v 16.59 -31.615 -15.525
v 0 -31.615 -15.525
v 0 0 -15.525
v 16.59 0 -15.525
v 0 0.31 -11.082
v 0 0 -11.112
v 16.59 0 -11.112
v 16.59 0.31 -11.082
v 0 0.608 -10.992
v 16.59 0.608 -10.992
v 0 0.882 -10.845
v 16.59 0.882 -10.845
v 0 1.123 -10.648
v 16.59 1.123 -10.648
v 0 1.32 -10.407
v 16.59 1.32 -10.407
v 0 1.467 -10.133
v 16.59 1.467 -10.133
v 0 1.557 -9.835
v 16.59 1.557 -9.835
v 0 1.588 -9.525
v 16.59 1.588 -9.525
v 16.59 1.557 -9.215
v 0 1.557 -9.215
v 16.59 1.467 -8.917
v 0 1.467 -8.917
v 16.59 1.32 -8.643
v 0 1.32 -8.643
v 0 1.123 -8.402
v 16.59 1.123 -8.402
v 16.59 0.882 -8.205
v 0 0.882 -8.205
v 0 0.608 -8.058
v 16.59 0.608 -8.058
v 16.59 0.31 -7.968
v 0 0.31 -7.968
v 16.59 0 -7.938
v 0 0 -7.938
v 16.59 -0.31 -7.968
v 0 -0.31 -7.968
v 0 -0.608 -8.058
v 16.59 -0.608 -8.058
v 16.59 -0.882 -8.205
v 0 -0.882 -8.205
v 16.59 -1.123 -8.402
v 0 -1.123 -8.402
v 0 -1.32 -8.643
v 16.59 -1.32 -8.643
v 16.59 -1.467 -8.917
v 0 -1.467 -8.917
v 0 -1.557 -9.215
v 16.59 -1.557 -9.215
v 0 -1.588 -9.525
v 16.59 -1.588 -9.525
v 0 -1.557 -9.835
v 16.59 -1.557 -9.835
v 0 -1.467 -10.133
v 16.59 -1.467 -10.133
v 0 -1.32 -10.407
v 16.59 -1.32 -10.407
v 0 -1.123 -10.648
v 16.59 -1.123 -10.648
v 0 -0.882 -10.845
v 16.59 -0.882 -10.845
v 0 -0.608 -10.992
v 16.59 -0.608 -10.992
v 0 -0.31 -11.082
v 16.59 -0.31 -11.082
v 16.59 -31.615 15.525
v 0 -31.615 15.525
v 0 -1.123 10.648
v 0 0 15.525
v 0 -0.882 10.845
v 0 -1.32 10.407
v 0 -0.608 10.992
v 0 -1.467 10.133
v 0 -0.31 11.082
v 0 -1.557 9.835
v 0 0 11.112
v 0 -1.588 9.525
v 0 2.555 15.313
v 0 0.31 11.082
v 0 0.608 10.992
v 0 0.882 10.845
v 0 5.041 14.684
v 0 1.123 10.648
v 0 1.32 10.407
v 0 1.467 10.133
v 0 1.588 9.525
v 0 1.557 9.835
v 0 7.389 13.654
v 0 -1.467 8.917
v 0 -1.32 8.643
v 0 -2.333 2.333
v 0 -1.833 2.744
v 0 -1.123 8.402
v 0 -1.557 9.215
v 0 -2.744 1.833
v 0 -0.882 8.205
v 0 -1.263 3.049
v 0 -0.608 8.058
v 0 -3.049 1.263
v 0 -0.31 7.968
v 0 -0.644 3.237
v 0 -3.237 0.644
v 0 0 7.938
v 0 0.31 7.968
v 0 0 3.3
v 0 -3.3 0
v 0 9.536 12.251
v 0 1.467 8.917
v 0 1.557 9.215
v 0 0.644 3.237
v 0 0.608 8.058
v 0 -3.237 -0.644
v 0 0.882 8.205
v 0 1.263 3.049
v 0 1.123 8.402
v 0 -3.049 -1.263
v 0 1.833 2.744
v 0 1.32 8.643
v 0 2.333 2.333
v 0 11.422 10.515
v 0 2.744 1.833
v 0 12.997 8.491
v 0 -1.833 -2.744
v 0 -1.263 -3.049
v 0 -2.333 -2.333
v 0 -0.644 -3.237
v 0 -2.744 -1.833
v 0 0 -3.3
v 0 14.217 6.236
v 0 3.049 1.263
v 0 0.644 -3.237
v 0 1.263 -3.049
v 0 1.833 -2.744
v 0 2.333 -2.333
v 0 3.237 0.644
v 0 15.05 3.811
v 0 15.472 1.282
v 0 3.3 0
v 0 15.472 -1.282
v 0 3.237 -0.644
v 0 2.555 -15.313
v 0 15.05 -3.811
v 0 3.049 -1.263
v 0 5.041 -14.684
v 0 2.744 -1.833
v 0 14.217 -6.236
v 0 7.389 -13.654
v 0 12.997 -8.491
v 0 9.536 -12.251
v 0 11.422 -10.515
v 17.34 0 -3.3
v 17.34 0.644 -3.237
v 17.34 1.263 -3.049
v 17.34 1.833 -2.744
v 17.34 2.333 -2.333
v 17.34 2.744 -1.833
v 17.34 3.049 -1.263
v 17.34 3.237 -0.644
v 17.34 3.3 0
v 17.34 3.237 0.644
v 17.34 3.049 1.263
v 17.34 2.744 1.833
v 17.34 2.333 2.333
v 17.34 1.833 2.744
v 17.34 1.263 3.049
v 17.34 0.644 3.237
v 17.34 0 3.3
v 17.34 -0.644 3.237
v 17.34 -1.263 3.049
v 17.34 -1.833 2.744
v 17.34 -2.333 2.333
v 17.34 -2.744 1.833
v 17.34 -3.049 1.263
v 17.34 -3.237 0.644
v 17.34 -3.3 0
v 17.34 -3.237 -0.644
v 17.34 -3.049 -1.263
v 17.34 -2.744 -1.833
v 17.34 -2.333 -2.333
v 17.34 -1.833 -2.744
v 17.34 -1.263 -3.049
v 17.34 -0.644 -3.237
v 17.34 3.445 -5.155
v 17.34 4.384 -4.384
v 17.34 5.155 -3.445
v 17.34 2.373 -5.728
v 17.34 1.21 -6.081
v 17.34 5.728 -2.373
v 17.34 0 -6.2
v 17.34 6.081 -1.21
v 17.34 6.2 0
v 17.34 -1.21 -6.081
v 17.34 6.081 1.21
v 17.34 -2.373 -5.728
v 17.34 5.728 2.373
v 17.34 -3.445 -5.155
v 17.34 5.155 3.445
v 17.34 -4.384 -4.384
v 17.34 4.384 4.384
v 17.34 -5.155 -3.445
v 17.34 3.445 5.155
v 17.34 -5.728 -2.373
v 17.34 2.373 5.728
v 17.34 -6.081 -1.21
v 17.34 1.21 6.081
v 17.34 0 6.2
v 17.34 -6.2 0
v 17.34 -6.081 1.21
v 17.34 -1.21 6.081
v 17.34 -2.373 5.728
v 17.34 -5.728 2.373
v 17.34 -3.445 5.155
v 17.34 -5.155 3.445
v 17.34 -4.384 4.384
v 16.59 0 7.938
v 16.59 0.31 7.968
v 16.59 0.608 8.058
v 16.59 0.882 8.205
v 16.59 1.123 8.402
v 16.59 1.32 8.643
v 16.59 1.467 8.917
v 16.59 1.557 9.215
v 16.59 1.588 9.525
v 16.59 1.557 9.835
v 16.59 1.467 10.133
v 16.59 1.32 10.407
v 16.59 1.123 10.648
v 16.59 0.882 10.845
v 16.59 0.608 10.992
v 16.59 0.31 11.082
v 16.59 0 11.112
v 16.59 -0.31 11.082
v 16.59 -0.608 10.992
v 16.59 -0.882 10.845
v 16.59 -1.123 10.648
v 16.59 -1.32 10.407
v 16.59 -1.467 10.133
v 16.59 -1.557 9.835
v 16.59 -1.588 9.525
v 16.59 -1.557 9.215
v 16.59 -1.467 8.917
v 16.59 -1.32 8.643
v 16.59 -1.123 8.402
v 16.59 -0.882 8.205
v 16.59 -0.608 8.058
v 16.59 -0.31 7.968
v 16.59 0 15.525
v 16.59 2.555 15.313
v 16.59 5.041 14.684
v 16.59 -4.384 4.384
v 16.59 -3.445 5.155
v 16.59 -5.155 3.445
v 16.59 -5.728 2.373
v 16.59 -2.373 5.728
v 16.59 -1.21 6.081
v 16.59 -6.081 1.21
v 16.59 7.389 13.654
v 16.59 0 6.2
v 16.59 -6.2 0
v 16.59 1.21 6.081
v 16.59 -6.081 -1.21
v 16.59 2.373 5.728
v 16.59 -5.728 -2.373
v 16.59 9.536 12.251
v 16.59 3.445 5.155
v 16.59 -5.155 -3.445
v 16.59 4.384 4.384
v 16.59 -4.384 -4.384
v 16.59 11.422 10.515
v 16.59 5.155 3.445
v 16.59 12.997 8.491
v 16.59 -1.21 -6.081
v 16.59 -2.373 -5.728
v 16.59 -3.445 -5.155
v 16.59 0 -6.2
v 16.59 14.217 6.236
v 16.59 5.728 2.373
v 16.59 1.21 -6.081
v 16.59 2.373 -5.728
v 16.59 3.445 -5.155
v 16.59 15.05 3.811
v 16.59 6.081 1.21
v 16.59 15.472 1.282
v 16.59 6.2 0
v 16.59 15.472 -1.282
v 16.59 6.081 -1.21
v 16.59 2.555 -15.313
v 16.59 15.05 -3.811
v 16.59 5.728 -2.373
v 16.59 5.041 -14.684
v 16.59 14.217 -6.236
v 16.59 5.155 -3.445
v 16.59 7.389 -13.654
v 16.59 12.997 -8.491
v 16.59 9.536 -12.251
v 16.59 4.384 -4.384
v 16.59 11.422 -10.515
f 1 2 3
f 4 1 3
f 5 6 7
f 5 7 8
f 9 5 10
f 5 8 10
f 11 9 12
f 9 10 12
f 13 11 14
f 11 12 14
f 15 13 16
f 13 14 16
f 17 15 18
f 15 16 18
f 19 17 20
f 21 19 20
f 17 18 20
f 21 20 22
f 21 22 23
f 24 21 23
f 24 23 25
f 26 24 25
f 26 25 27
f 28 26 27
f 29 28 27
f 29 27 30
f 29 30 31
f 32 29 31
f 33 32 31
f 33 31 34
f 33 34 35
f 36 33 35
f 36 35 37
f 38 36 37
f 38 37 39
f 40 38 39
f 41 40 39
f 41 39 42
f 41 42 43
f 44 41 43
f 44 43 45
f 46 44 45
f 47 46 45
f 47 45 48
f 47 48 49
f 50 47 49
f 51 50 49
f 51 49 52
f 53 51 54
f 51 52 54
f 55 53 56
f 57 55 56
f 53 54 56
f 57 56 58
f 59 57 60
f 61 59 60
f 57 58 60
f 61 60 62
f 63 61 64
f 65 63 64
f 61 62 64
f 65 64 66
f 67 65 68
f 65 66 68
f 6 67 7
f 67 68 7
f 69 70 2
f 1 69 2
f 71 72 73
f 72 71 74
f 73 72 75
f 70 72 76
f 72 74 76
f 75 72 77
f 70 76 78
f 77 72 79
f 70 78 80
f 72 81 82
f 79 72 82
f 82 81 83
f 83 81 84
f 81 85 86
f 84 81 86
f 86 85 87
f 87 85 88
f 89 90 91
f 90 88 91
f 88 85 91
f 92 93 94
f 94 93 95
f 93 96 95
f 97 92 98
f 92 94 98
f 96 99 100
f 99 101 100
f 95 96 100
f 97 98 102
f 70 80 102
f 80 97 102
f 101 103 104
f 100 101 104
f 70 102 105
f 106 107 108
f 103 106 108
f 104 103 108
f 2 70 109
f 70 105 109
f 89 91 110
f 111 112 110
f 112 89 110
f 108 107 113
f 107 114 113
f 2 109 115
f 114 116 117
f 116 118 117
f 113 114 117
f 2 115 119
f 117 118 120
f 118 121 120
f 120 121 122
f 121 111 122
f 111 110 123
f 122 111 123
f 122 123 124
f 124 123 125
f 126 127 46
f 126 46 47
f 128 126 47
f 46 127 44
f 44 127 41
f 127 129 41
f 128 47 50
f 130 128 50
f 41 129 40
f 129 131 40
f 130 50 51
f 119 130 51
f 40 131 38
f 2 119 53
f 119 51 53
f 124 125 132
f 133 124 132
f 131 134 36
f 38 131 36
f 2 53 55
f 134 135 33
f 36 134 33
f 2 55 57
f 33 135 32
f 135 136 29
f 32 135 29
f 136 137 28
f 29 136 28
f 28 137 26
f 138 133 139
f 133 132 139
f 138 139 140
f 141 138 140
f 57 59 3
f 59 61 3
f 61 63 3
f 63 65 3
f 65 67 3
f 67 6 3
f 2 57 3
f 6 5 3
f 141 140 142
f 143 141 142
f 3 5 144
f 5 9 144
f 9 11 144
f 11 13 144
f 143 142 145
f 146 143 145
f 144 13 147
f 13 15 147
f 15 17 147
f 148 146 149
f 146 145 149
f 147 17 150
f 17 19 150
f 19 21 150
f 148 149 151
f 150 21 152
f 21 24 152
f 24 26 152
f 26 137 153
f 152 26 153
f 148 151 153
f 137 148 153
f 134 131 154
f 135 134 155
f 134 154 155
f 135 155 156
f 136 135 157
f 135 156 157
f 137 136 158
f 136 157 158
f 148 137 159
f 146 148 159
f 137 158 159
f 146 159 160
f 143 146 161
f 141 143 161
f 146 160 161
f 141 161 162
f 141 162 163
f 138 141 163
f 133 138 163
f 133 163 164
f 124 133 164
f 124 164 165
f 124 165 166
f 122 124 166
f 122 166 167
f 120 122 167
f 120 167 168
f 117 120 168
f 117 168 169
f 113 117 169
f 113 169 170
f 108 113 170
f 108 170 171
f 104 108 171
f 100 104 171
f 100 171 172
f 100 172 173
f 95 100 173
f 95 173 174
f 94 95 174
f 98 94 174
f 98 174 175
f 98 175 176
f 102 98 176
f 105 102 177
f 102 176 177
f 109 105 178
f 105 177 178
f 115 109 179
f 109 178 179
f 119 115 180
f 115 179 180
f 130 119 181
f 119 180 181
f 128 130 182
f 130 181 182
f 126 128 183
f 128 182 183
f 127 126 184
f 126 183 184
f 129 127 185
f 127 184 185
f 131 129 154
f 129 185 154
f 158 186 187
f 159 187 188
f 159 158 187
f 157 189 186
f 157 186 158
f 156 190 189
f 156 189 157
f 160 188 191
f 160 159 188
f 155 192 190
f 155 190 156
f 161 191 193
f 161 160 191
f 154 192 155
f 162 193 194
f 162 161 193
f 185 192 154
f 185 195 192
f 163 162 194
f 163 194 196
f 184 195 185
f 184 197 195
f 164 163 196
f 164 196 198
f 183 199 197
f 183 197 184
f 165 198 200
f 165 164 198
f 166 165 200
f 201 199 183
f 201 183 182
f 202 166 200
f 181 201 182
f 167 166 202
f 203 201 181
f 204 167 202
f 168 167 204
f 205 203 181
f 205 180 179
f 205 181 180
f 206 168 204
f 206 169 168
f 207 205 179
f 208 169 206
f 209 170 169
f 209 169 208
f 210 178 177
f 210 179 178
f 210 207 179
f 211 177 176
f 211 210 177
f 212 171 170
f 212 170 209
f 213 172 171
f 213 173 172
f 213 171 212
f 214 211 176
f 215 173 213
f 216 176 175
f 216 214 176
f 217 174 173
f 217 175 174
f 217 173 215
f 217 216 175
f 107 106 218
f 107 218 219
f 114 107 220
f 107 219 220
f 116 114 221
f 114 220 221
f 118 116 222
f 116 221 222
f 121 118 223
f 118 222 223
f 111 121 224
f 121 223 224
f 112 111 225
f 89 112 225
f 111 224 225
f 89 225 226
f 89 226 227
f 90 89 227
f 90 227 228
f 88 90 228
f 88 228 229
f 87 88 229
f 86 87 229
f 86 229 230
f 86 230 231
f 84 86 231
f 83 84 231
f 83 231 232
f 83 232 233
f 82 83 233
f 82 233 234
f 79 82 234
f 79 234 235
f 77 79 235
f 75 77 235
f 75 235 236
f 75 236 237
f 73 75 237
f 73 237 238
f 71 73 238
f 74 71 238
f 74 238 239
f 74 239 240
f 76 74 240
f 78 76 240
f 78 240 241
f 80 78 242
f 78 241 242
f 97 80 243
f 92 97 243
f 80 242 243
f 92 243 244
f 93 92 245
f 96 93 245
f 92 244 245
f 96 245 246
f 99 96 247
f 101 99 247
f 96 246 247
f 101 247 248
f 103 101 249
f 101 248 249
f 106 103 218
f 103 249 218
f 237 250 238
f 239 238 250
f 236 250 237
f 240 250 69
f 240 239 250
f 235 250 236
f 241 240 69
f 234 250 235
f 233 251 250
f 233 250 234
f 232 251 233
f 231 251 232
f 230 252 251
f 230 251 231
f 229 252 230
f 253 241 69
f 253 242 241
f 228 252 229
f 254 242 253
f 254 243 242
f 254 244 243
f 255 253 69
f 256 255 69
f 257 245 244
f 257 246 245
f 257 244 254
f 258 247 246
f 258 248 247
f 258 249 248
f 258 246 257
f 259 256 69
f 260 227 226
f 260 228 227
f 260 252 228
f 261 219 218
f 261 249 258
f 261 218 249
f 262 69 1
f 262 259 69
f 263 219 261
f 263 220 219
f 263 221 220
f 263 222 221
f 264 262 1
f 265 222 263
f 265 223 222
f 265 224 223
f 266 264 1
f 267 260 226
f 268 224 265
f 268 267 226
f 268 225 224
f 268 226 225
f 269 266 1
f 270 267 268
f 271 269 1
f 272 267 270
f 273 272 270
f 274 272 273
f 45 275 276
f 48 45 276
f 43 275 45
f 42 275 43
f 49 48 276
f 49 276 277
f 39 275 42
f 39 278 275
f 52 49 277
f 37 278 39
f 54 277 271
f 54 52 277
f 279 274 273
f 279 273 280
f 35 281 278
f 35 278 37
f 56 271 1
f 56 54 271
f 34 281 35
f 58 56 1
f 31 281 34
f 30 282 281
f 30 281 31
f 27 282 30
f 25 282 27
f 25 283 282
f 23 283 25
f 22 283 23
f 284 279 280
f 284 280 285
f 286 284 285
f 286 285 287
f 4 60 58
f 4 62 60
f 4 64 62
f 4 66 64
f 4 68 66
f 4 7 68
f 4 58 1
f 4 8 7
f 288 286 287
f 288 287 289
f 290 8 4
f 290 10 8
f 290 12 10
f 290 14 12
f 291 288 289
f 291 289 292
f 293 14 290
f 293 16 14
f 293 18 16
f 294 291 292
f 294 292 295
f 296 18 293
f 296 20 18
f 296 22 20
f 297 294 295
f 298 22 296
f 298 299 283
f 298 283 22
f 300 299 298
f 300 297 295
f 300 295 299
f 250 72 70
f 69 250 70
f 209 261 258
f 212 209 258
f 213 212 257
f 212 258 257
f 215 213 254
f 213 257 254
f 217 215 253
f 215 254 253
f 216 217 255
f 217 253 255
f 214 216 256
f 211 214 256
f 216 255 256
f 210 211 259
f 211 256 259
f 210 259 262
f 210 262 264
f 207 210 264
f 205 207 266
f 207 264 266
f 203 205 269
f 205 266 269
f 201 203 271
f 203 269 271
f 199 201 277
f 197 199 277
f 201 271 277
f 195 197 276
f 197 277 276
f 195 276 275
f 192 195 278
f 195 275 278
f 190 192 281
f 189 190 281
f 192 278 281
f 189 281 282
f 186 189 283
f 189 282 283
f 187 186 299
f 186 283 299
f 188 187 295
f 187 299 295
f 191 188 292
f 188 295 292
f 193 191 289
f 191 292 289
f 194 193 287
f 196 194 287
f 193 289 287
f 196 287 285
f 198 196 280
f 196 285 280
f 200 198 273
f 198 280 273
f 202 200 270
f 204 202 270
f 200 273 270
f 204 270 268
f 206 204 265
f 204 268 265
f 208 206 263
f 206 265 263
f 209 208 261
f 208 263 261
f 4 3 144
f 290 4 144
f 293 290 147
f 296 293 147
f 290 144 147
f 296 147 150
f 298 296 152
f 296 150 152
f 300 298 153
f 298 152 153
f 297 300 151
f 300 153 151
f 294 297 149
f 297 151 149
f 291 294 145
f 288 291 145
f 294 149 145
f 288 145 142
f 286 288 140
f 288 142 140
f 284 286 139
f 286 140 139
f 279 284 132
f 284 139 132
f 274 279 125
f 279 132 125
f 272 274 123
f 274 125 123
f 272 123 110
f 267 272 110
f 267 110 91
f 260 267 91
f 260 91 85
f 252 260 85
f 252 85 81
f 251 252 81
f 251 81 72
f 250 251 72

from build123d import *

# Parameters (mm, degrees)
BOSS_EXTRUDE1_DEPTH = 16.59
SKETCH2_R           = 6.2
BOSS_EXTRUDE2_DEPTH = 0.75
SKETCH3_R           = 3.3
SKETCH3_R_2         = 1.5875
CUT_EXTRUDE1_DEPTH  = 40.258240536


with BuildPart() as part:
    # Sketch1 → Boss-Extrude1 (new body)
    with BuildSketch(Plane(origin=(0, 0, 0), x_dir=(0, 0, -1), z_dir=(1, 0, 0))):
        with BuildLine():
            Line((-15.525, -31.615), (15.525, -31.615))
            Line((15.525, -31.615), (15.525, 0))
            ThreePointArc((15.525, 0), (0, 15.525), (-15.525, 0))
            Line((-15.525, 0), (-15.525, -31.615))
        make_face()
    extrude(amount=BOSS_EXTRUDE1_DEPTH)

    # Sketch2 → Boss-Extrude2 (add)
    with BuildSketch(Plane(origin=(16.59, 0, 0), x_dir=(0, 0, -1), z_dir=(1, 0, 0))):
        with Locations(Location((0, 0, 0), (0, 0, 180))):
            Circle(SKETCH2_R)
    extrude(amount=BOSS_EXTRUDE2_DEPTH)

    # Sketch3 → Cut-Extrude1 (cut, through all)
    with BuildSketch(Plane(origin=(17.34, 0, 0), x_dir=(0, 0, -1), z_dir=(1, 0, 0))):
        Circle(SKETCH3_R)
        with Locations((-9.525, 0)):
            Circle(SKETCH3_R_2)
        with Locations((9.525, 0)):
            Circle(SKETCH3_R_2)
    extrude(amount=-CUT_EXTRUDE1_DEPTH, mode=Mode.SUBTRACT)


solid = part.part
